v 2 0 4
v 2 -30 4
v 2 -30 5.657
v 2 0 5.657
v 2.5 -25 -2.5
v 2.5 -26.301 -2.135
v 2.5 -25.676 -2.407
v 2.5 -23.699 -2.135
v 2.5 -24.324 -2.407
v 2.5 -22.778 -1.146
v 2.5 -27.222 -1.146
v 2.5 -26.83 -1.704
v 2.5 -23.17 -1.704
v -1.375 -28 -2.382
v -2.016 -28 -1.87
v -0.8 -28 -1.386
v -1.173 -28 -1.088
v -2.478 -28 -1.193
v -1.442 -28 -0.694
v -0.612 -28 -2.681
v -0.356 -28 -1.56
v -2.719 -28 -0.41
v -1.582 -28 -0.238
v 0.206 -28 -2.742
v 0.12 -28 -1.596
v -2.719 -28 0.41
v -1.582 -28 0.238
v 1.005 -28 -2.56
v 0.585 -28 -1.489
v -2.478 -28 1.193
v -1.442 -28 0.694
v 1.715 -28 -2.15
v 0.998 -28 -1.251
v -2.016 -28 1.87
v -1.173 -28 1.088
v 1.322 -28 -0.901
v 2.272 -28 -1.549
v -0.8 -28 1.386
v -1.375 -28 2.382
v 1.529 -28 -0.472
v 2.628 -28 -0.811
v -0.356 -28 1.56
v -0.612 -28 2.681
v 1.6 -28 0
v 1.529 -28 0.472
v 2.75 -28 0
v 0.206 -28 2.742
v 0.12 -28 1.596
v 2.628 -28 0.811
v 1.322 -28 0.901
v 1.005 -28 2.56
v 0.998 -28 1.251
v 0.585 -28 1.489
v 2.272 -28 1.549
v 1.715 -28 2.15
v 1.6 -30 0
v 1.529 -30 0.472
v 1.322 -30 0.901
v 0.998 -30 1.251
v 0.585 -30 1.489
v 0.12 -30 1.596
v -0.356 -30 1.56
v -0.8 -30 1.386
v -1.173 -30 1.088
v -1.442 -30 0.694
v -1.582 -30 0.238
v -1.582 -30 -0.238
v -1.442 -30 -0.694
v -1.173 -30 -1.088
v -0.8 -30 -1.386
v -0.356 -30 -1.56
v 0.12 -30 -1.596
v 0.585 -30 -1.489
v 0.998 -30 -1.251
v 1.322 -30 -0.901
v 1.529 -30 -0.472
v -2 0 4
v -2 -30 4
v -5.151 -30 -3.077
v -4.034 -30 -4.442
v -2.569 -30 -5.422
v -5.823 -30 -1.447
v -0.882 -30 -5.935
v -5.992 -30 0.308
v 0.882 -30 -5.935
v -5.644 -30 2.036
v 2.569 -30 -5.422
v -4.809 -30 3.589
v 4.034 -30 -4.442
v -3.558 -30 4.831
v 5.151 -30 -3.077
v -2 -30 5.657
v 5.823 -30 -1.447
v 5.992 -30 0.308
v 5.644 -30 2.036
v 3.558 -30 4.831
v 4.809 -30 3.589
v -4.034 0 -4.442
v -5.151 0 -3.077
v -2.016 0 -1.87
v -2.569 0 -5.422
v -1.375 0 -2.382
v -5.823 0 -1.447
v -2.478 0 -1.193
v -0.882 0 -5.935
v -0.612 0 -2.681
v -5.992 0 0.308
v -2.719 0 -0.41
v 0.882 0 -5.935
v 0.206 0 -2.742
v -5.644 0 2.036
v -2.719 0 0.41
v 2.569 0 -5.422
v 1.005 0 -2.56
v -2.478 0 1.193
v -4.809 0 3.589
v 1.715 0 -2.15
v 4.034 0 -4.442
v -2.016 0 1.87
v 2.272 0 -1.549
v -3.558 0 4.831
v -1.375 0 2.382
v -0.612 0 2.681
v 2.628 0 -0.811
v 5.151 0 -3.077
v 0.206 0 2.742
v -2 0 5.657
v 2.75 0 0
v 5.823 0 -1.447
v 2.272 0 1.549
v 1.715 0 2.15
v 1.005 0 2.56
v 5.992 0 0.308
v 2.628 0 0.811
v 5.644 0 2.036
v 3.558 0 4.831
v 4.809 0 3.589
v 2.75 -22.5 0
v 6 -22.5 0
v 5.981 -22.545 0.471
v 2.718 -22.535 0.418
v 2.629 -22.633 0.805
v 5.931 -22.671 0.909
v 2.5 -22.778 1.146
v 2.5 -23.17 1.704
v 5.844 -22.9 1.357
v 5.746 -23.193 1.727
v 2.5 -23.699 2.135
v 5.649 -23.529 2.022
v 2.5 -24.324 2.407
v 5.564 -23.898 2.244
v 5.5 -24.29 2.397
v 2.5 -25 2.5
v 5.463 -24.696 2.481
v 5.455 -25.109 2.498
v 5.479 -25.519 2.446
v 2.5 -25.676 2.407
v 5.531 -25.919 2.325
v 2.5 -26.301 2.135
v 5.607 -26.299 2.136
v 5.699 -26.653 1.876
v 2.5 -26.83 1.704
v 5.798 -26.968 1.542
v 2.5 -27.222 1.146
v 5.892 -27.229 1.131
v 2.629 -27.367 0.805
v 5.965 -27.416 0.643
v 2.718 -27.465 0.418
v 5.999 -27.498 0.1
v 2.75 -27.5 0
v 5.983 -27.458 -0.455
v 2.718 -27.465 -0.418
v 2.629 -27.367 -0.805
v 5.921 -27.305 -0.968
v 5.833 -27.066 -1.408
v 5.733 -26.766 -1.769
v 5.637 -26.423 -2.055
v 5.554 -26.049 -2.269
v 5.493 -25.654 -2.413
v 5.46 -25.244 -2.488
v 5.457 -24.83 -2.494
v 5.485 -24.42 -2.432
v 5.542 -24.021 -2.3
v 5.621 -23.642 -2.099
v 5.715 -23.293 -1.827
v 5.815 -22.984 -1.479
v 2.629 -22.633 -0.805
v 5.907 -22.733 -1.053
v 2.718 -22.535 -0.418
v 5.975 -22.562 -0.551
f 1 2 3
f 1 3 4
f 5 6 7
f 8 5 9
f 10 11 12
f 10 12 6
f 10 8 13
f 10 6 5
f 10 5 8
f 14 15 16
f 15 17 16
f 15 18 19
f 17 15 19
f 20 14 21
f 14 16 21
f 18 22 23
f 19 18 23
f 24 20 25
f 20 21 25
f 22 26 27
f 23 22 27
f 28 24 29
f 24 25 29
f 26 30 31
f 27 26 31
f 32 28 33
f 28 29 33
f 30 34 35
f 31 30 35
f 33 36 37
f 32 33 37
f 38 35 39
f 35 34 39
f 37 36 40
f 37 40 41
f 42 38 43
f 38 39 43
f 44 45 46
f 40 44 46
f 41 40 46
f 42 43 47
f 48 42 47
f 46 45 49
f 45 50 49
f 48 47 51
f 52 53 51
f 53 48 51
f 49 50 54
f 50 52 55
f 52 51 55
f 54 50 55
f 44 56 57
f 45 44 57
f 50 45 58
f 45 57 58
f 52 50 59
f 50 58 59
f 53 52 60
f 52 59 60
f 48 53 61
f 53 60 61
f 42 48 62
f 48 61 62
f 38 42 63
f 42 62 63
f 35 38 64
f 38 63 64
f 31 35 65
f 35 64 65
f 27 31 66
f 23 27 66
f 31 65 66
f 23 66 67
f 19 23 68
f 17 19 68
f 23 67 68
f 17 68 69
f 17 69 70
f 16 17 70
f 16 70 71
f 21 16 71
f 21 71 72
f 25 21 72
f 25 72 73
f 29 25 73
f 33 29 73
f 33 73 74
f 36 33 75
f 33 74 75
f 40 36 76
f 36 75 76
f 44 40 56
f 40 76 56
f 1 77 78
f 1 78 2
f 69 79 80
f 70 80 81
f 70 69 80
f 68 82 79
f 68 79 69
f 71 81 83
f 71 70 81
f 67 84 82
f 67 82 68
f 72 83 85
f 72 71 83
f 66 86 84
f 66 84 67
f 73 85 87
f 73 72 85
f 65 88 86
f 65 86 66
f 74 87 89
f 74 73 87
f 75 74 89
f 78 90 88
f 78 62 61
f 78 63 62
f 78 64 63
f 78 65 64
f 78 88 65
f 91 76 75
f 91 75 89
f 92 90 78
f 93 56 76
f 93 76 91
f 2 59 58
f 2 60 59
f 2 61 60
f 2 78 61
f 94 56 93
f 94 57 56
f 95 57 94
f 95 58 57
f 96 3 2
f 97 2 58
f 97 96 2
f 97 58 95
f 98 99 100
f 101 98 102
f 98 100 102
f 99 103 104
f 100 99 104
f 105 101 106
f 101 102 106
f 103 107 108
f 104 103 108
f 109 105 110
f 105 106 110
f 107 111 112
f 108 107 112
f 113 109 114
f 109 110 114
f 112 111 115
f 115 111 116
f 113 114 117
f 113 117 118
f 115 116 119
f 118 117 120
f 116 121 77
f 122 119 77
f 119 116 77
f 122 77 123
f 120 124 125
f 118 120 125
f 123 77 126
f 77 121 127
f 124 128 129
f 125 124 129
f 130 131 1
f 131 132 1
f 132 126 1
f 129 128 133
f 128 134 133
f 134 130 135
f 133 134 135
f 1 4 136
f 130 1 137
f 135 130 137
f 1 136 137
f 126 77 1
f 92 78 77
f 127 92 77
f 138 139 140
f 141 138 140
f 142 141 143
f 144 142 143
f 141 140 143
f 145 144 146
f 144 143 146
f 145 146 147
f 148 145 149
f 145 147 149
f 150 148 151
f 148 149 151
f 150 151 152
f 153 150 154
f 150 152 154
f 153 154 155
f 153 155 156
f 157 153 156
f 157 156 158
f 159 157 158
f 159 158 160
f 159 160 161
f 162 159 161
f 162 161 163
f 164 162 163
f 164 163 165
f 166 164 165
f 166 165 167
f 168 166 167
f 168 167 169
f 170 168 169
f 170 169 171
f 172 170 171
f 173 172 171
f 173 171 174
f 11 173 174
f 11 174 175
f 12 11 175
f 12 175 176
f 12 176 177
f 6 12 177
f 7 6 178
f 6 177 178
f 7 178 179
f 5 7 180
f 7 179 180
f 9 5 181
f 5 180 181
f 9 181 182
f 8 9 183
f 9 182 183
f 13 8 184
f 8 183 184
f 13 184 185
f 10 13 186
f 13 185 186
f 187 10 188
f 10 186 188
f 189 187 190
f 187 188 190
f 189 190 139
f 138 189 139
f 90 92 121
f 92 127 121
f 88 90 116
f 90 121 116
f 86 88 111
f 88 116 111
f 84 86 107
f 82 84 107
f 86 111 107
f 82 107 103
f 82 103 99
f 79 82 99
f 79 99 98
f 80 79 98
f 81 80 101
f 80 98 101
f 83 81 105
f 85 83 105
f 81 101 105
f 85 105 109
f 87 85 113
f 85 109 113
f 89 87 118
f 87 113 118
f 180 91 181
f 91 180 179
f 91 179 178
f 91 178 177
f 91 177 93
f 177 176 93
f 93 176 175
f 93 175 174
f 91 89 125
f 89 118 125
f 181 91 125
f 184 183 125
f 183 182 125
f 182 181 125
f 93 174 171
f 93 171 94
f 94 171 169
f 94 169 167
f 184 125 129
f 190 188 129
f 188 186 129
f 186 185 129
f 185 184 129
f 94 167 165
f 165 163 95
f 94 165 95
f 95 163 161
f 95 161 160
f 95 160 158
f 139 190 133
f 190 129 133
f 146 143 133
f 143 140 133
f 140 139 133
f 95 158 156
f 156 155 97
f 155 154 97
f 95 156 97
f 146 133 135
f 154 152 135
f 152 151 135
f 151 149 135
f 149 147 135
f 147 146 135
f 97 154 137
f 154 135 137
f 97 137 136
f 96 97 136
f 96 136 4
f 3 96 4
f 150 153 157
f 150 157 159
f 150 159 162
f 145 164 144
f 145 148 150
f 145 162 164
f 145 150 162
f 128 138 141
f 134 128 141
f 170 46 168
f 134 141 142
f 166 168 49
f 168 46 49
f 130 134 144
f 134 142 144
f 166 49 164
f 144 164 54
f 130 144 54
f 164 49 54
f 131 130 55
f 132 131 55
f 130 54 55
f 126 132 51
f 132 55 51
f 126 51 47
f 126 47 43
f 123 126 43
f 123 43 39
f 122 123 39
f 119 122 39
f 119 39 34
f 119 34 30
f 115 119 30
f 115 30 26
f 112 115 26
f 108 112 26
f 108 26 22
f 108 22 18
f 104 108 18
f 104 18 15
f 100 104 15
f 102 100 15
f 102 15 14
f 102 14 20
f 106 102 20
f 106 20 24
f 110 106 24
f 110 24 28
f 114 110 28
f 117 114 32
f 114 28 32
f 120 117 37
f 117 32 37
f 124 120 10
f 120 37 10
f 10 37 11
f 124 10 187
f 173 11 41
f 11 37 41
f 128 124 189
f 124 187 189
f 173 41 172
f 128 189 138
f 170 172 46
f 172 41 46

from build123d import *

# Parameters (mm, degrees)
F0_R      = 6
F1_DEPTH  = 30
F2_R      = 2.75
F3_DEPTH  = 30.001
F8_R      = 5
F8_R_2    = 1.6
F9_DEPTH  = 2
F12_W     = 4
F12_H     = 30
F13_DEPTH = 3
F14_R     = 2.5
F15_DEPTH = 3.5


with BuildPart() as f1:
    # F0 (on Front) → F1 (new body)
    with BuildSketch(Plane.XZ):
        Circle(F0_R)
    extrude(amount=F1_DEPTH)

    # F2 (on face) → F3 (cut, through all)
    with BuildSketch(Plane.XZ.offset(30)):
        Circle(F2_R)
    extrude(amount=-F3_DEPTH, mode=Mode.SUBTRACT)

    # F8 (on face) → F9 (join)
    with BuildSketch(Plane.XZ.offset(30)):
        Circle(F8_R)
        Circle(F8_R_2, mode=Mode.SUBTRACT)
    extrude(amount=-F9_DEPTH)

    # F12 (on offset) → F13 (cut)
    with BuildSketch(Plane.XY.offset(4)):
        with Locations((0, -15)):
            Rectangle(F12_W, F12_H)
    extrude(amount=F13_DEPTH, mode=Mode.SUBTRACT)

    # F14 (on offset) → F15 (cut)
    with BuildSketch(Plane.YZ.offset(6)):
        with Locations((-25, 0)):
            Circle(F14_R)
    extrude(amount=-F15_DEPTH, mode=Mode.SUBTRACT)


solid = f1.part
